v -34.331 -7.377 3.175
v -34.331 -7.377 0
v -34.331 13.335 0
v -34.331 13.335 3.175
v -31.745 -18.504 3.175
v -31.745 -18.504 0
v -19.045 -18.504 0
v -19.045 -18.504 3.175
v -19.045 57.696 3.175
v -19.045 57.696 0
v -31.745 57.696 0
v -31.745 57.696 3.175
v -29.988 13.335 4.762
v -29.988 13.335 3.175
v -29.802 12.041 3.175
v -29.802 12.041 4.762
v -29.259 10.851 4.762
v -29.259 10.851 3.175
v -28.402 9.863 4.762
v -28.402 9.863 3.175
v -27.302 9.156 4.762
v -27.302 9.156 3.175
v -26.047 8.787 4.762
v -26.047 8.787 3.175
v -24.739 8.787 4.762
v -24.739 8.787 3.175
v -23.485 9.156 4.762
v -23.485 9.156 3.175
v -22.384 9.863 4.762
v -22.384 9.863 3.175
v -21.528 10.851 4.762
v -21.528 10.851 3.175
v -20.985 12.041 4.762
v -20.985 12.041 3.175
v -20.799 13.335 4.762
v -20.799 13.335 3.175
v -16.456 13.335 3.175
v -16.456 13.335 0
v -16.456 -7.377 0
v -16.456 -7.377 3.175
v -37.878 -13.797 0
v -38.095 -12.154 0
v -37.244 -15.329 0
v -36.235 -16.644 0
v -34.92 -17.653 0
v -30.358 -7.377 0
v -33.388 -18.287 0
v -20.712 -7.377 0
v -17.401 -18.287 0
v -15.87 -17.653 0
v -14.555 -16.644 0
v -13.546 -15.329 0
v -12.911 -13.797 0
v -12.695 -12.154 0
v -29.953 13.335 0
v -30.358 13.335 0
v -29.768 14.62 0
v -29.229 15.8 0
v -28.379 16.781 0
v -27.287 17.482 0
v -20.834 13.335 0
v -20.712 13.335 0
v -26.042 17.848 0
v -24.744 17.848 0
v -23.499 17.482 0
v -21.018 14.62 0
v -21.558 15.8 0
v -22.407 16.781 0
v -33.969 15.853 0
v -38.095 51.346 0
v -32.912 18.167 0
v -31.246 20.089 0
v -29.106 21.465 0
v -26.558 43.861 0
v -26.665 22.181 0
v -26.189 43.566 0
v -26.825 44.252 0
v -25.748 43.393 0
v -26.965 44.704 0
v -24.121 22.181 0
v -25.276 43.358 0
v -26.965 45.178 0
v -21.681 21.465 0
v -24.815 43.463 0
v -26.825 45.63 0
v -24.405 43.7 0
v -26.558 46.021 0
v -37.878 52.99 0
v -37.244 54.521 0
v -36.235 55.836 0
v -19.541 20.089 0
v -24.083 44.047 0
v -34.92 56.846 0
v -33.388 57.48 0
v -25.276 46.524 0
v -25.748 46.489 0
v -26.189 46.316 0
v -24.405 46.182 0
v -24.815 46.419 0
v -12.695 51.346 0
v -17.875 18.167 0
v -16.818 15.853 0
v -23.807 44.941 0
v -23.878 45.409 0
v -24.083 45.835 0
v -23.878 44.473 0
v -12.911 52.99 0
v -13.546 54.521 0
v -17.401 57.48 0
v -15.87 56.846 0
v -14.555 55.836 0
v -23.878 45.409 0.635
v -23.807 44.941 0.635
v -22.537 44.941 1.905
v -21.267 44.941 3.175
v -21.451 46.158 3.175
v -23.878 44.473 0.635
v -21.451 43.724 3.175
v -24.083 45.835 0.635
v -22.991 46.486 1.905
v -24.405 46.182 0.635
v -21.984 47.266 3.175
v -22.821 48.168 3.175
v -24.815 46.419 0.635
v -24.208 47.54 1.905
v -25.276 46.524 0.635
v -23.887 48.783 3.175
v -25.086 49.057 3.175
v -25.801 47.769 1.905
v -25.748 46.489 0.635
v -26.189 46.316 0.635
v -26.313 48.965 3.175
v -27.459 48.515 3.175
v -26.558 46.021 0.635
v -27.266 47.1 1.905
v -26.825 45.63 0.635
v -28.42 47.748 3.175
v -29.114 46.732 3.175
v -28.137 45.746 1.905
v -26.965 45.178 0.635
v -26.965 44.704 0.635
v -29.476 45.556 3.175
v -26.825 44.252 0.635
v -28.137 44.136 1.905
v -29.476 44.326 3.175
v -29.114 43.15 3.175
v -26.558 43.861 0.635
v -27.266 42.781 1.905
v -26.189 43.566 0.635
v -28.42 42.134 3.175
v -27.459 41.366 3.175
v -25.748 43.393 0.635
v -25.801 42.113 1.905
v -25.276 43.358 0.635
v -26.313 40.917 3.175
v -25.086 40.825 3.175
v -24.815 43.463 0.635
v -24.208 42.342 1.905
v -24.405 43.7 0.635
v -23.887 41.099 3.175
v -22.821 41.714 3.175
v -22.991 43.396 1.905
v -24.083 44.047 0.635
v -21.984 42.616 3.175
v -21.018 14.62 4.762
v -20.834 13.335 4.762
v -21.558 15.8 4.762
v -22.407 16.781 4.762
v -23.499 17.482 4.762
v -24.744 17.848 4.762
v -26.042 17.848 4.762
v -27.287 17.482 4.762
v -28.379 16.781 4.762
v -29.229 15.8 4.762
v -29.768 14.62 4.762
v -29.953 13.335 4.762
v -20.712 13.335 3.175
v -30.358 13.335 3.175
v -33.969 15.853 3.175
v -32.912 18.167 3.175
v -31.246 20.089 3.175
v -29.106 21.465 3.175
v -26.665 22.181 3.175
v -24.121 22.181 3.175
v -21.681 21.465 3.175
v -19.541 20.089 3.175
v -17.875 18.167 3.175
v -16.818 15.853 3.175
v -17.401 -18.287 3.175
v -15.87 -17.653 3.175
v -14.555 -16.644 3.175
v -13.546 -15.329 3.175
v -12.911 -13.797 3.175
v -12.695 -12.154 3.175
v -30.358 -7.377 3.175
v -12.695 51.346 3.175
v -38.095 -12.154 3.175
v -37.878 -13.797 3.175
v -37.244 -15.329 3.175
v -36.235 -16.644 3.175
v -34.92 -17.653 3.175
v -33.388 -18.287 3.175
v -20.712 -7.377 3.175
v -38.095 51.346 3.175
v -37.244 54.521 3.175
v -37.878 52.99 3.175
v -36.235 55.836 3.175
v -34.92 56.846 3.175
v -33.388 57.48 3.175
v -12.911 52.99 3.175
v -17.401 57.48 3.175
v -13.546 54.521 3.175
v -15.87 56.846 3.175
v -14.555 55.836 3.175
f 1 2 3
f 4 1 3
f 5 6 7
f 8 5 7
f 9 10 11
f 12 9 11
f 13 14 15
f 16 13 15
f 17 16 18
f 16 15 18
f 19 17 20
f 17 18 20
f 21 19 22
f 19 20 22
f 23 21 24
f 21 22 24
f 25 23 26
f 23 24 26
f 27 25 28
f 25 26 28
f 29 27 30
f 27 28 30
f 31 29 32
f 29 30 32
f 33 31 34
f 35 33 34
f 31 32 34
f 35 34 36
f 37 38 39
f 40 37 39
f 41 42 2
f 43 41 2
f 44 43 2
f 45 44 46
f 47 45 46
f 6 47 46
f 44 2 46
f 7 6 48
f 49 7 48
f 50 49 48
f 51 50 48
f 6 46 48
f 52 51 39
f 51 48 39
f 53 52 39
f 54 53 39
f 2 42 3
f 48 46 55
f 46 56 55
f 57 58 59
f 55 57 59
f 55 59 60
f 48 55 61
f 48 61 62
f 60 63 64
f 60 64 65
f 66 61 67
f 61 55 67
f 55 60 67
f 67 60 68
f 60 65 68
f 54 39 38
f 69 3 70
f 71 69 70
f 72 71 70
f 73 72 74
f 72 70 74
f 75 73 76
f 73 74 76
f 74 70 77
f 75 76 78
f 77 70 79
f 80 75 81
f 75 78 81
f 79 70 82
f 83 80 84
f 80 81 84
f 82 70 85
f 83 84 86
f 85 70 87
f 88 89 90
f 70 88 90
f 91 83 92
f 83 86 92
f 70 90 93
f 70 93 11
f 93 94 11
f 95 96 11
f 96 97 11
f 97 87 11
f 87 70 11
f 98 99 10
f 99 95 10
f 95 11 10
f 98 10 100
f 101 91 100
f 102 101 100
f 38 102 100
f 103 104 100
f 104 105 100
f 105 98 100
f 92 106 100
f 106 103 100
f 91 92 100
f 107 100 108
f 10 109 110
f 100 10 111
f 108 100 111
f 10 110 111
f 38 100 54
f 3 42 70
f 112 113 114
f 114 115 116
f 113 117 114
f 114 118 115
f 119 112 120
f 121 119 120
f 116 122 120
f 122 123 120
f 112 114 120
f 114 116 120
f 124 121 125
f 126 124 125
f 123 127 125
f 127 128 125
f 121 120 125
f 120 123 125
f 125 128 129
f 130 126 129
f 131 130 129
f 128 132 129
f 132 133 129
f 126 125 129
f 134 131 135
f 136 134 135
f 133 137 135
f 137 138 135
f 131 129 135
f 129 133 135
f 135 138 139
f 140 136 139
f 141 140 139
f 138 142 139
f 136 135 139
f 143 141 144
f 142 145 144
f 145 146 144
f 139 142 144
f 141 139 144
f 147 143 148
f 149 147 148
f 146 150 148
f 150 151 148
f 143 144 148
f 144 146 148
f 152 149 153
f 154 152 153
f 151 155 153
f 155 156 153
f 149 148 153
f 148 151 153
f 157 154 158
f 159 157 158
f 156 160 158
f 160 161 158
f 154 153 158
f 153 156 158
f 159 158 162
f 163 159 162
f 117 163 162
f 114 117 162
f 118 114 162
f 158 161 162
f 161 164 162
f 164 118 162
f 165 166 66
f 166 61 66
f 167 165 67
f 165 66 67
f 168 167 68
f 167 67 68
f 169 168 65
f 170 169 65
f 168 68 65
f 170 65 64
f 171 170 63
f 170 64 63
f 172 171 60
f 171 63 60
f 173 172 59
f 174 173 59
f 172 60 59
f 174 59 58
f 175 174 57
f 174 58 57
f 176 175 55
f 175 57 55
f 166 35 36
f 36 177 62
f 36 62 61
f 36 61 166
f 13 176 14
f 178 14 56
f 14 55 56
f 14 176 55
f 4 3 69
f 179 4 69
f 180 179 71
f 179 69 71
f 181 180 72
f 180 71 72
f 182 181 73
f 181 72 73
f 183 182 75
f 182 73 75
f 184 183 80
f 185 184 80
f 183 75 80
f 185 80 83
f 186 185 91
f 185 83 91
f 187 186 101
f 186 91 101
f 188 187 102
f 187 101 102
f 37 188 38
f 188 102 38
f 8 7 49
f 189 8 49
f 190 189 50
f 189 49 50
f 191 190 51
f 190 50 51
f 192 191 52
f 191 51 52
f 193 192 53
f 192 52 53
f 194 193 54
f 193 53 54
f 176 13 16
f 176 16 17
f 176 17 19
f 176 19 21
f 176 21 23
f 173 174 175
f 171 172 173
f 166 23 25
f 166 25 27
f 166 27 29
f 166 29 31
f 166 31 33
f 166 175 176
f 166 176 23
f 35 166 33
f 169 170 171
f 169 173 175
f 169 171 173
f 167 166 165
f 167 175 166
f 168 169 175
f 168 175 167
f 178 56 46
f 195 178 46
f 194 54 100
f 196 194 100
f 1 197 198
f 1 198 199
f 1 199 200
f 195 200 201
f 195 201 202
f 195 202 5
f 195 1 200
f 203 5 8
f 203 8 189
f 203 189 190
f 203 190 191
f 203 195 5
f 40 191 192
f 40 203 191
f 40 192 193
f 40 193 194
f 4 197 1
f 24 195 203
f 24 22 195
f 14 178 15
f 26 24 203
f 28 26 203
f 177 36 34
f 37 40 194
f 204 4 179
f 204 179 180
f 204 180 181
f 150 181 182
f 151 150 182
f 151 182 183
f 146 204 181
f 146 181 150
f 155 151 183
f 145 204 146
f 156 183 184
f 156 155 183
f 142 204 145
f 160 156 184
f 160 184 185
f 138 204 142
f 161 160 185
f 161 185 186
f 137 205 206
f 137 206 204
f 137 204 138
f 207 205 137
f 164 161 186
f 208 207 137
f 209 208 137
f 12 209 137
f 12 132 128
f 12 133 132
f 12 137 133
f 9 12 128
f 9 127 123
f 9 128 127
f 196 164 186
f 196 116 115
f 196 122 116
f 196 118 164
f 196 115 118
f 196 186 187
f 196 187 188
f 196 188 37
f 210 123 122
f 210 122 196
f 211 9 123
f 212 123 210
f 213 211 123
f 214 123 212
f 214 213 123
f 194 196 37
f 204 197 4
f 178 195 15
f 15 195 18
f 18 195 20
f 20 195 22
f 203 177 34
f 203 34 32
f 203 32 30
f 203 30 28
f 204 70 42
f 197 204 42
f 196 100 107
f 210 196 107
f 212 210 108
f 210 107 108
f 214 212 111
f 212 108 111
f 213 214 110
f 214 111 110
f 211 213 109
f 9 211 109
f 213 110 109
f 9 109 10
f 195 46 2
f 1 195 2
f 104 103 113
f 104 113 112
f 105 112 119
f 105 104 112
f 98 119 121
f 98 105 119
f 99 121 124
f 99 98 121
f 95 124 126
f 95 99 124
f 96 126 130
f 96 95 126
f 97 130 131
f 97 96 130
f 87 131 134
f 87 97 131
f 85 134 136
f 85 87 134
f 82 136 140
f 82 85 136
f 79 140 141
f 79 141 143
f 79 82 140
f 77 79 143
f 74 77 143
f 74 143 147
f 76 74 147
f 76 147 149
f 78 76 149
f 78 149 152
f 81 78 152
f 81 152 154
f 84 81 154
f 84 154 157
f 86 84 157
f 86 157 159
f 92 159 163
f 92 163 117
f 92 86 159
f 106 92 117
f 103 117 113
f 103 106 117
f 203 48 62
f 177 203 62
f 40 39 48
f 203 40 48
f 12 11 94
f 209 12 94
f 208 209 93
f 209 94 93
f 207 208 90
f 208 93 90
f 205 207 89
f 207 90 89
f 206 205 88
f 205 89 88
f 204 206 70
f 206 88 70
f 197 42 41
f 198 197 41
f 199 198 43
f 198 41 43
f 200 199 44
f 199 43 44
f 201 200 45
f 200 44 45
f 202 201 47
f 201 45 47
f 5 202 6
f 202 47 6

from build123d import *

# Parameters (mm, degrees)
F0_R     = 1.5875
F1_DEPTH = 3.175
F3_DEPTH = 1.5875
F4_SIZE  = 2.54


with BuildPart() as f1:
    # F0 (on Top) → F1 (new body)
    with BuildSketch(Plane.XY):
        with BuildLine():
            ThreePointArc((-38.094764, -12.153731), (-36.234892, -16.643859), (-31.744764, -18.503731))
            Line((-31.744764, -18.503731), (-19.044764, -18.503731))
            ThreePointArc((-19.044764, -18.503731), (-14.554635, -16.643859), (-12.694764, -12.153731))
            Line((-12.694764, -12.153731), (-12.694764, 51.346269))
            ThreePointArc((-12.694764, 51.346269), (-14.554635, 55.836397), (-19.044764, 57.696269))
            Line((-19.044764, 57.696269), (-31.744764, 57.696269))
            ThreePointArc((-31.744764, 57.696269), (-36.234892, 55.836397), (-38.094764, 51.346269))
            Line((-38.094764, 51.346269), (-38.094764, -12.153731))
        make_face()
        with BuildLine():
            Line((-29.952724, 13.335001), (-30.358404, 13.335001))
            Line((-30.358404, 13.335001), (-30.358404, -7.376809))
            Line((-30.358404, -7.376809), (-34.330532, -7.376809))
            Line((-34.330532, -7.376809), (-34.330532, 13.335001))
            ThreePointArc((-34.330532, 13.335001), (-25.393245, 22.272288), (-16.455958, 13.335001))
            Line((-16.455958, 13.335001), (-16.455958, -7.376809))
            Line((-16.455958, -7.376809), (-20.711809, -7.376809))
            Line((-20.711809, -7.376809), (-20.711809, 13.335001))
            Line((-20.711809, 13.335001), (-20.833766, 13.335001))
            ThreePointArc((-20.833766, 13.335001), (-25.393245, 17.89448), (-29.952724, 13.335001))
        make_face(mode=Mode.SUBTRACT)
        with Locations((-25.394764, 44.940945)):
            Circle(F0_R, mode=Mode.SUBTRACT)
    extrude(amount=F1_DEPTH)

    # F2 (on face) → F3 (join)
    with BuildSketch(Plane.XY.offset(3.175)):
        with BuildLine():
            ThreePointArc((-29.987899, 13.335001), (-25.393245, 8.740347), (-20.798591, 13.335001))
            Line((-20.798591, 13.335001), (-20.833766, 13.335001))
            ThreePointArc((-20.833766, 13.335001), (-25.393245, 17.89448), (-29.952724, 13.335001))
            Line((-29.952724, 13.335001), (-29.987899, 13.335001))
        make_face()
    extrude(amount=F3_DEPTH)

    # F4
    f4_edges = [f1.edges().sort_by_distance(p)[0] for p in [
        (-26.982264, 44.940945, 3.175),
    ]]
    chamfer(f4_edges, length=F4_SIZE)


solid = f1.part
